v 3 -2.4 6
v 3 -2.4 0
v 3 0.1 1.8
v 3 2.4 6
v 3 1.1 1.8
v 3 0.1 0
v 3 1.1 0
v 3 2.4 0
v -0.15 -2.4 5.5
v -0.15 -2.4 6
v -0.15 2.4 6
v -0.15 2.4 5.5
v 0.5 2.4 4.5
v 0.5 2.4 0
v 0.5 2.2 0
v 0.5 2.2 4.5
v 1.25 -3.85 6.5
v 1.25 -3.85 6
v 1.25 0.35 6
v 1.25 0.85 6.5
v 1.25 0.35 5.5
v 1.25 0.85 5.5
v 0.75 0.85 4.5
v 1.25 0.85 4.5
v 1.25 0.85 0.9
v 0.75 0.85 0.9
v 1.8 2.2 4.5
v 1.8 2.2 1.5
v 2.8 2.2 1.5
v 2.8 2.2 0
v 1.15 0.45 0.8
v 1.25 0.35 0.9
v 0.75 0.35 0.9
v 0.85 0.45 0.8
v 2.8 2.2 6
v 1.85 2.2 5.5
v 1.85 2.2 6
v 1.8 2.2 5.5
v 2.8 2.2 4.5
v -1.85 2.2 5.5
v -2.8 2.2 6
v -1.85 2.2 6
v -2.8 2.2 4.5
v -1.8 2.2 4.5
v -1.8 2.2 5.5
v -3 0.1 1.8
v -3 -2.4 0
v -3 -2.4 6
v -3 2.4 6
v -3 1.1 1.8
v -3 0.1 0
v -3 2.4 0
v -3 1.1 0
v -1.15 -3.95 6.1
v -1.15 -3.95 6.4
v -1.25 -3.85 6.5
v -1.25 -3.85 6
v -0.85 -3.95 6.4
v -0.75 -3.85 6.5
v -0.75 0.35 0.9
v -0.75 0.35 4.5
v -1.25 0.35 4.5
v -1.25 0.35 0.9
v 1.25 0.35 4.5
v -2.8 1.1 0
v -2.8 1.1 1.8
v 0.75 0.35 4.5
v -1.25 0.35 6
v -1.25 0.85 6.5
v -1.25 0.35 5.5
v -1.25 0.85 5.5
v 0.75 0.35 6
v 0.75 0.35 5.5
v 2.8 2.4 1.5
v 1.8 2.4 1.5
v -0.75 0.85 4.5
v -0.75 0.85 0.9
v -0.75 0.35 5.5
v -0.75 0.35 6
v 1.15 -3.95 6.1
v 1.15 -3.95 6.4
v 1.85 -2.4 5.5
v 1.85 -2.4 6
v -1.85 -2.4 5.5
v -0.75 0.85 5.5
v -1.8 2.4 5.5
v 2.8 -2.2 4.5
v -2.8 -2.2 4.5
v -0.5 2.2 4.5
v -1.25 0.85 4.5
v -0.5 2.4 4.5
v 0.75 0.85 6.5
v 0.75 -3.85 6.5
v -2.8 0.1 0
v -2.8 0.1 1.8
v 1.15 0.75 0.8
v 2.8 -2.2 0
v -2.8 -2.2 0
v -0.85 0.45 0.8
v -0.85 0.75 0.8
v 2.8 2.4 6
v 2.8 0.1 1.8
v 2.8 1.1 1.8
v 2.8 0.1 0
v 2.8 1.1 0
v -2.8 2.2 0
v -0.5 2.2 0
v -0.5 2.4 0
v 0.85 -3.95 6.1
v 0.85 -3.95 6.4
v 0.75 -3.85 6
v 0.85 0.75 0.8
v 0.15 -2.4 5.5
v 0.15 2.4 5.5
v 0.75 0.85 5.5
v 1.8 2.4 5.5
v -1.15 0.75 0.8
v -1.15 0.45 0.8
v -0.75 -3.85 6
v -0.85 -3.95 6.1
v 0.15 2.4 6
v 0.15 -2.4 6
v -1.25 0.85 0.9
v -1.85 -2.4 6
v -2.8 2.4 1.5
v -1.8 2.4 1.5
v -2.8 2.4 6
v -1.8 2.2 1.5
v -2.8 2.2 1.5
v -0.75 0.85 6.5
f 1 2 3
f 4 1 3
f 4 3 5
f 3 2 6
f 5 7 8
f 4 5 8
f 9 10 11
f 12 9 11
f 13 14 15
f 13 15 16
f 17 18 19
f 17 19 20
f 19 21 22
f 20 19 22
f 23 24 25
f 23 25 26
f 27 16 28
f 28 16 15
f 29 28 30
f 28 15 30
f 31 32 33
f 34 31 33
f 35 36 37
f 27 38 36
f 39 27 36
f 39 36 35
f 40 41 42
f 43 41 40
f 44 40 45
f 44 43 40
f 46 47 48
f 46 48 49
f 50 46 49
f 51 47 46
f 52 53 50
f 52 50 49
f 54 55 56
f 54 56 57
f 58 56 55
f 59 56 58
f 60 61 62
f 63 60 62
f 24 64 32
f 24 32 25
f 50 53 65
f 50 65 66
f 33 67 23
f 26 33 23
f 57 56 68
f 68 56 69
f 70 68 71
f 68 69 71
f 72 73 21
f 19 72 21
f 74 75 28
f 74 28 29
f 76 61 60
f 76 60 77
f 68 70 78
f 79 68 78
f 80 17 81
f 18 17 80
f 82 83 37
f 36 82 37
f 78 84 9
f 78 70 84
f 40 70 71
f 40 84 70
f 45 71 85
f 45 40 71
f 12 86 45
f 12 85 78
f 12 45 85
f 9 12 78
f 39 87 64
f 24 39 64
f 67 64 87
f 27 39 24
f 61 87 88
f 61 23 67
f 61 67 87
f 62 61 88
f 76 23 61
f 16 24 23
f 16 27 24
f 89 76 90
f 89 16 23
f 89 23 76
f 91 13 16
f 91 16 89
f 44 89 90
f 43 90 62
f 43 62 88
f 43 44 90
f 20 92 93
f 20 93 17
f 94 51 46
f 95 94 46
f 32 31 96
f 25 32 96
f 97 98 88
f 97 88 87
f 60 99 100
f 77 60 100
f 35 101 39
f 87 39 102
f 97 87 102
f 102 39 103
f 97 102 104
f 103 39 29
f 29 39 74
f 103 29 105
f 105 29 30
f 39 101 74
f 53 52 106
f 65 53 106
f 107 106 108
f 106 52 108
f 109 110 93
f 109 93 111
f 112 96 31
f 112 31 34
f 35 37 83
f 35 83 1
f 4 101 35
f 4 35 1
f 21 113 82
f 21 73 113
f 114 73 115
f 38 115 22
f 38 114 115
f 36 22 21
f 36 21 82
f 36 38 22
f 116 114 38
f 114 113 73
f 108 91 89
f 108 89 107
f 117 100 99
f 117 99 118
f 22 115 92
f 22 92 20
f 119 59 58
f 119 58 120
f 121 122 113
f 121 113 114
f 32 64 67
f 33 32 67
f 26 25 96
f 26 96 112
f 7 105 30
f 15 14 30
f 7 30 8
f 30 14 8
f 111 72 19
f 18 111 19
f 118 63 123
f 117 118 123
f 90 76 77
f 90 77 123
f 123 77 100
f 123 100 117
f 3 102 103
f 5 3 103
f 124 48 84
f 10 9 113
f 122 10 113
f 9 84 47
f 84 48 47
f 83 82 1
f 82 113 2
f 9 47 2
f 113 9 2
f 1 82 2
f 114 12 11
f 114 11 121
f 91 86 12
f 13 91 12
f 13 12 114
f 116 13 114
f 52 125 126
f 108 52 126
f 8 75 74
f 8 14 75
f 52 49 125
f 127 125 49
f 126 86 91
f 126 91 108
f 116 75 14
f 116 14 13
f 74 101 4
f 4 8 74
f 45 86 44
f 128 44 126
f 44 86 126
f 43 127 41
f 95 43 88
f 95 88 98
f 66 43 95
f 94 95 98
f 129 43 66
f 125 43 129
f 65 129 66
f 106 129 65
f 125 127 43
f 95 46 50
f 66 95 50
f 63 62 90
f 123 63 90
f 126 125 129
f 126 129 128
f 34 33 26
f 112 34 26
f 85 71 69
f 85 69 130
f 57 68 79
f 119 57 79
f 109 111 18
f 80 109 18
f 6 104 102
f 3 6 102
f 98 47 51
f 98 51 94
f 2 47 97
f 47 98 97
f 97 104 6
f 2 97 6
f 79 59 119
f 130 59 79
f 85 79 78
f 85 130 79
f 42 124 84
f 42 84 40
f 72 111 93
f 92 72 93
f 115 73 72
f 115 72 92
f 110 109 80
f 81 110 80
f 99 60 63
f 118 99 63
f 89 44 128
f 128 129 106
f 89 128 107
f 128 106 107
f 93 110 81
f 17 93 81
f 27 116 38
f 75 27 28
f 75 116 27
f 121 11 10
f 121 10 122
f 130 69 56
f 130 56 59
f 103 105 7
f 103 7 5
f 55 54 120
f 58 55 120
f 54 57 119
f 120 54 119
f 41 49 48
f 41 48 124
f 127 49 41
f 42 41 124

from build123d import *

# Parameters (mm, degrees)
SKETCH_1_W           = 6
SKETCH_1_H           = 4.8
SKETCH_1_W_2         = 5.6
SKETCH_1_H_2         = 4.4
EXTRUDE_1_DEPTH      = 6
SKETCH_2_W           = 5.6
SKETCH_2_H           = 4.4
EXTRUDE_1_2_DEPTH    = 1.5
SKETCH_3_W           = 1
SKETCH_3_H           = 4.5
CUT_EXTRUDE_1_DEPTH  = 0.2
SKETCH_4_W           = 1.8
SKETCH_4_H           = 1
CUT_EXTRUDE_2_DEPTH  = 9.818163074
SKETCH_5_W           = 0.5
SKETCH_5_H           = 0.5
EXTRUDE_2_DEPTH      = 3.7
SKETCH_7_W           = 1.7
SKETCH_7_H           = 4.8
CUT_EXTRUDE_3_DEPTH  = 0.5
EXTRUDE_3_DEPTH      = 0.5
EXTRUDE_3_DEPTH_BACK = 0.5
SKETCH_6_W           = 0.5
SKETCH_6_H           = 0.5
SKETCH_8_W           = 0.5
SKETCH_8_H           = 0.5
EXTRUDE_4_DEPTH      = 4.8
CHAMFER_1_SIZE       = 0.1


with BuildPart() as part:
    # 草图1 → Extrude 1 (new body)
    with BuildSketch(Plane.XY):
        Rectangle(SKETCH_1_W, SKETCH_1_H)
        Rectangle(SKETCH_1_W_2, SKETCH_1_H_2, mode=Mode.SUBTRACT)
    extrude(amount=EXTRUDE_1_DEPTH)

    # 草图2 → Extrude 1 2 (add)
    with BuildSketch(Plane.XY.offset(6)):
        Rectangle(SKETCH_2_W, SKETCH_2_H)
    extrude(amount=-EXTRUDE_1_2_DEPTH)

    # 草图3 → 切除-拉伸1 (cut)
    with BuildSketch(Plane(origin=(0, 2.4, 0), x_dir=(1, 0, 0), z_dir=(0, 1, 0))):
        Polygon((0, 0), (0.5, 0), (0.5, -4.5), (-0.5, -4.5), (-0.5, 0), align=None)
        with Locations((-2.3, -3.75)):
            Rectangle(SKETCH_3_W, SKETCH_3_H)
        with Locations((2.3, -3.75)):
            Rectangle(SKETCH_3_W, SKETCH_3_H)
    extrude(amount=-CUT_EXTRUDE_1_DEPTH, mode=Mode.SUBTRACT)

    # 草图4 → 切除-拉伸2 (cut, through all)
    with BuildSketch(Plane.ZY.offset(3)):
        with Locations((0.9, 0.6)):
            Rectangle(SKETCH_4_W, SKETCH_4_H)
    extrude(amount=-CUT_EXTRUDE_2_DEPTH, mode=Mode.SUBTRACT)

    # 草图5 → 凸台-拉伸2 (add)
    with BuildSketch(Plane(origin=(0, 0, 4.5), x_dir=(-1, 0, 0), z_dir=(0, 0, -1))):
        with Locations((-1, 0.6)):
            Rectangle(SKETCH_5_W, SKETCH_5_H)
        with Locations((1, 0.6)):
            Rectangle(SKETCH_5_W, SKETCH_5_H)
    extrude(amount=EXTRUDE_2_DEPTH)

    # 草图7 → 切除-拉伸3 (cut)
    with BuildSketch(Plane.XY.offset(6)):
        with Locations((-1, 0)):
            Rectangle(SKETCH_7_W, SKETCH_7_H)
        with Locations((1, 0)):
            Rectangle(SKETCH_7_W, SKETCH_7_H)
    extrude(amount=-CUT_EXTRUDE_3_DEPTH, mode=Mode.SUBTRACT)

    # 草图6 → 凸台-拉伸3 (add, two sides: drawn at the far end of the back side and taken through both)
    with BuildSketch(Plane.XY.offset(6).offset(-EXTRUDE_3_DEPTH_BACK)):
        with Locations((-1, 0.6)):
            Rectangle(SKETCH_6_W, SKETCH_6_H)
        with Locations((1, 0.6)):
            Rectangle(SKETCH_6_W, SKETCH_6_H)
    extrude(amount=EXTRUDE_3_DEPTH + EXTRUDE_3_DEPTH_BACK)

    # 草图8 → 凸台-拉伸4 (add)
    with BuildSketch(Plane(origin=(0, 0.85, 0), x_dir=(1, 0, 0), z_dir=(0, 1, 0))):
        with Locations((-1, -6.25)):
            Rectangle(SKETCH_8_W, SKETCH_8_H)
        with Locations((1, -6.25)):
            Rectangle(SKETCH_8_W, SKETCH_8_H)
    extrude(amount=-EXTRUDE_4_DEPTH)

    # 倒角1
    chamfer_1_edges = [part.edges().sort_by_distance(p)[0] for p in [
        (0.75, 0.6, 0.8),
        (1, 0.85, 0.8),
        (1.25, 0.6, 0.8),
        (1, 0.35, 0.8),
        (-1.25, 0.6, 0.8),
        (-1, 0.85, 0.8),
        (-0.75, 0.6, 0.8),
        (-1, 0.35, 0.8),
        (-1.25, -3.95, 6.25),
        (-1, -3.95, 6),
        (-0.75, -3.95, 6.25),
        (-1, -3.95, 6.5),
        (0.75, -3.95, 6.25),
        (1, -3.95, 6),
        (1.25, -3.95, 6.25),
        (1, -3.95, 6.5),
    ]]
    chamfer(chamfer_1_edges, length=CHAMFER_1_SIZE)


solid = part.part
